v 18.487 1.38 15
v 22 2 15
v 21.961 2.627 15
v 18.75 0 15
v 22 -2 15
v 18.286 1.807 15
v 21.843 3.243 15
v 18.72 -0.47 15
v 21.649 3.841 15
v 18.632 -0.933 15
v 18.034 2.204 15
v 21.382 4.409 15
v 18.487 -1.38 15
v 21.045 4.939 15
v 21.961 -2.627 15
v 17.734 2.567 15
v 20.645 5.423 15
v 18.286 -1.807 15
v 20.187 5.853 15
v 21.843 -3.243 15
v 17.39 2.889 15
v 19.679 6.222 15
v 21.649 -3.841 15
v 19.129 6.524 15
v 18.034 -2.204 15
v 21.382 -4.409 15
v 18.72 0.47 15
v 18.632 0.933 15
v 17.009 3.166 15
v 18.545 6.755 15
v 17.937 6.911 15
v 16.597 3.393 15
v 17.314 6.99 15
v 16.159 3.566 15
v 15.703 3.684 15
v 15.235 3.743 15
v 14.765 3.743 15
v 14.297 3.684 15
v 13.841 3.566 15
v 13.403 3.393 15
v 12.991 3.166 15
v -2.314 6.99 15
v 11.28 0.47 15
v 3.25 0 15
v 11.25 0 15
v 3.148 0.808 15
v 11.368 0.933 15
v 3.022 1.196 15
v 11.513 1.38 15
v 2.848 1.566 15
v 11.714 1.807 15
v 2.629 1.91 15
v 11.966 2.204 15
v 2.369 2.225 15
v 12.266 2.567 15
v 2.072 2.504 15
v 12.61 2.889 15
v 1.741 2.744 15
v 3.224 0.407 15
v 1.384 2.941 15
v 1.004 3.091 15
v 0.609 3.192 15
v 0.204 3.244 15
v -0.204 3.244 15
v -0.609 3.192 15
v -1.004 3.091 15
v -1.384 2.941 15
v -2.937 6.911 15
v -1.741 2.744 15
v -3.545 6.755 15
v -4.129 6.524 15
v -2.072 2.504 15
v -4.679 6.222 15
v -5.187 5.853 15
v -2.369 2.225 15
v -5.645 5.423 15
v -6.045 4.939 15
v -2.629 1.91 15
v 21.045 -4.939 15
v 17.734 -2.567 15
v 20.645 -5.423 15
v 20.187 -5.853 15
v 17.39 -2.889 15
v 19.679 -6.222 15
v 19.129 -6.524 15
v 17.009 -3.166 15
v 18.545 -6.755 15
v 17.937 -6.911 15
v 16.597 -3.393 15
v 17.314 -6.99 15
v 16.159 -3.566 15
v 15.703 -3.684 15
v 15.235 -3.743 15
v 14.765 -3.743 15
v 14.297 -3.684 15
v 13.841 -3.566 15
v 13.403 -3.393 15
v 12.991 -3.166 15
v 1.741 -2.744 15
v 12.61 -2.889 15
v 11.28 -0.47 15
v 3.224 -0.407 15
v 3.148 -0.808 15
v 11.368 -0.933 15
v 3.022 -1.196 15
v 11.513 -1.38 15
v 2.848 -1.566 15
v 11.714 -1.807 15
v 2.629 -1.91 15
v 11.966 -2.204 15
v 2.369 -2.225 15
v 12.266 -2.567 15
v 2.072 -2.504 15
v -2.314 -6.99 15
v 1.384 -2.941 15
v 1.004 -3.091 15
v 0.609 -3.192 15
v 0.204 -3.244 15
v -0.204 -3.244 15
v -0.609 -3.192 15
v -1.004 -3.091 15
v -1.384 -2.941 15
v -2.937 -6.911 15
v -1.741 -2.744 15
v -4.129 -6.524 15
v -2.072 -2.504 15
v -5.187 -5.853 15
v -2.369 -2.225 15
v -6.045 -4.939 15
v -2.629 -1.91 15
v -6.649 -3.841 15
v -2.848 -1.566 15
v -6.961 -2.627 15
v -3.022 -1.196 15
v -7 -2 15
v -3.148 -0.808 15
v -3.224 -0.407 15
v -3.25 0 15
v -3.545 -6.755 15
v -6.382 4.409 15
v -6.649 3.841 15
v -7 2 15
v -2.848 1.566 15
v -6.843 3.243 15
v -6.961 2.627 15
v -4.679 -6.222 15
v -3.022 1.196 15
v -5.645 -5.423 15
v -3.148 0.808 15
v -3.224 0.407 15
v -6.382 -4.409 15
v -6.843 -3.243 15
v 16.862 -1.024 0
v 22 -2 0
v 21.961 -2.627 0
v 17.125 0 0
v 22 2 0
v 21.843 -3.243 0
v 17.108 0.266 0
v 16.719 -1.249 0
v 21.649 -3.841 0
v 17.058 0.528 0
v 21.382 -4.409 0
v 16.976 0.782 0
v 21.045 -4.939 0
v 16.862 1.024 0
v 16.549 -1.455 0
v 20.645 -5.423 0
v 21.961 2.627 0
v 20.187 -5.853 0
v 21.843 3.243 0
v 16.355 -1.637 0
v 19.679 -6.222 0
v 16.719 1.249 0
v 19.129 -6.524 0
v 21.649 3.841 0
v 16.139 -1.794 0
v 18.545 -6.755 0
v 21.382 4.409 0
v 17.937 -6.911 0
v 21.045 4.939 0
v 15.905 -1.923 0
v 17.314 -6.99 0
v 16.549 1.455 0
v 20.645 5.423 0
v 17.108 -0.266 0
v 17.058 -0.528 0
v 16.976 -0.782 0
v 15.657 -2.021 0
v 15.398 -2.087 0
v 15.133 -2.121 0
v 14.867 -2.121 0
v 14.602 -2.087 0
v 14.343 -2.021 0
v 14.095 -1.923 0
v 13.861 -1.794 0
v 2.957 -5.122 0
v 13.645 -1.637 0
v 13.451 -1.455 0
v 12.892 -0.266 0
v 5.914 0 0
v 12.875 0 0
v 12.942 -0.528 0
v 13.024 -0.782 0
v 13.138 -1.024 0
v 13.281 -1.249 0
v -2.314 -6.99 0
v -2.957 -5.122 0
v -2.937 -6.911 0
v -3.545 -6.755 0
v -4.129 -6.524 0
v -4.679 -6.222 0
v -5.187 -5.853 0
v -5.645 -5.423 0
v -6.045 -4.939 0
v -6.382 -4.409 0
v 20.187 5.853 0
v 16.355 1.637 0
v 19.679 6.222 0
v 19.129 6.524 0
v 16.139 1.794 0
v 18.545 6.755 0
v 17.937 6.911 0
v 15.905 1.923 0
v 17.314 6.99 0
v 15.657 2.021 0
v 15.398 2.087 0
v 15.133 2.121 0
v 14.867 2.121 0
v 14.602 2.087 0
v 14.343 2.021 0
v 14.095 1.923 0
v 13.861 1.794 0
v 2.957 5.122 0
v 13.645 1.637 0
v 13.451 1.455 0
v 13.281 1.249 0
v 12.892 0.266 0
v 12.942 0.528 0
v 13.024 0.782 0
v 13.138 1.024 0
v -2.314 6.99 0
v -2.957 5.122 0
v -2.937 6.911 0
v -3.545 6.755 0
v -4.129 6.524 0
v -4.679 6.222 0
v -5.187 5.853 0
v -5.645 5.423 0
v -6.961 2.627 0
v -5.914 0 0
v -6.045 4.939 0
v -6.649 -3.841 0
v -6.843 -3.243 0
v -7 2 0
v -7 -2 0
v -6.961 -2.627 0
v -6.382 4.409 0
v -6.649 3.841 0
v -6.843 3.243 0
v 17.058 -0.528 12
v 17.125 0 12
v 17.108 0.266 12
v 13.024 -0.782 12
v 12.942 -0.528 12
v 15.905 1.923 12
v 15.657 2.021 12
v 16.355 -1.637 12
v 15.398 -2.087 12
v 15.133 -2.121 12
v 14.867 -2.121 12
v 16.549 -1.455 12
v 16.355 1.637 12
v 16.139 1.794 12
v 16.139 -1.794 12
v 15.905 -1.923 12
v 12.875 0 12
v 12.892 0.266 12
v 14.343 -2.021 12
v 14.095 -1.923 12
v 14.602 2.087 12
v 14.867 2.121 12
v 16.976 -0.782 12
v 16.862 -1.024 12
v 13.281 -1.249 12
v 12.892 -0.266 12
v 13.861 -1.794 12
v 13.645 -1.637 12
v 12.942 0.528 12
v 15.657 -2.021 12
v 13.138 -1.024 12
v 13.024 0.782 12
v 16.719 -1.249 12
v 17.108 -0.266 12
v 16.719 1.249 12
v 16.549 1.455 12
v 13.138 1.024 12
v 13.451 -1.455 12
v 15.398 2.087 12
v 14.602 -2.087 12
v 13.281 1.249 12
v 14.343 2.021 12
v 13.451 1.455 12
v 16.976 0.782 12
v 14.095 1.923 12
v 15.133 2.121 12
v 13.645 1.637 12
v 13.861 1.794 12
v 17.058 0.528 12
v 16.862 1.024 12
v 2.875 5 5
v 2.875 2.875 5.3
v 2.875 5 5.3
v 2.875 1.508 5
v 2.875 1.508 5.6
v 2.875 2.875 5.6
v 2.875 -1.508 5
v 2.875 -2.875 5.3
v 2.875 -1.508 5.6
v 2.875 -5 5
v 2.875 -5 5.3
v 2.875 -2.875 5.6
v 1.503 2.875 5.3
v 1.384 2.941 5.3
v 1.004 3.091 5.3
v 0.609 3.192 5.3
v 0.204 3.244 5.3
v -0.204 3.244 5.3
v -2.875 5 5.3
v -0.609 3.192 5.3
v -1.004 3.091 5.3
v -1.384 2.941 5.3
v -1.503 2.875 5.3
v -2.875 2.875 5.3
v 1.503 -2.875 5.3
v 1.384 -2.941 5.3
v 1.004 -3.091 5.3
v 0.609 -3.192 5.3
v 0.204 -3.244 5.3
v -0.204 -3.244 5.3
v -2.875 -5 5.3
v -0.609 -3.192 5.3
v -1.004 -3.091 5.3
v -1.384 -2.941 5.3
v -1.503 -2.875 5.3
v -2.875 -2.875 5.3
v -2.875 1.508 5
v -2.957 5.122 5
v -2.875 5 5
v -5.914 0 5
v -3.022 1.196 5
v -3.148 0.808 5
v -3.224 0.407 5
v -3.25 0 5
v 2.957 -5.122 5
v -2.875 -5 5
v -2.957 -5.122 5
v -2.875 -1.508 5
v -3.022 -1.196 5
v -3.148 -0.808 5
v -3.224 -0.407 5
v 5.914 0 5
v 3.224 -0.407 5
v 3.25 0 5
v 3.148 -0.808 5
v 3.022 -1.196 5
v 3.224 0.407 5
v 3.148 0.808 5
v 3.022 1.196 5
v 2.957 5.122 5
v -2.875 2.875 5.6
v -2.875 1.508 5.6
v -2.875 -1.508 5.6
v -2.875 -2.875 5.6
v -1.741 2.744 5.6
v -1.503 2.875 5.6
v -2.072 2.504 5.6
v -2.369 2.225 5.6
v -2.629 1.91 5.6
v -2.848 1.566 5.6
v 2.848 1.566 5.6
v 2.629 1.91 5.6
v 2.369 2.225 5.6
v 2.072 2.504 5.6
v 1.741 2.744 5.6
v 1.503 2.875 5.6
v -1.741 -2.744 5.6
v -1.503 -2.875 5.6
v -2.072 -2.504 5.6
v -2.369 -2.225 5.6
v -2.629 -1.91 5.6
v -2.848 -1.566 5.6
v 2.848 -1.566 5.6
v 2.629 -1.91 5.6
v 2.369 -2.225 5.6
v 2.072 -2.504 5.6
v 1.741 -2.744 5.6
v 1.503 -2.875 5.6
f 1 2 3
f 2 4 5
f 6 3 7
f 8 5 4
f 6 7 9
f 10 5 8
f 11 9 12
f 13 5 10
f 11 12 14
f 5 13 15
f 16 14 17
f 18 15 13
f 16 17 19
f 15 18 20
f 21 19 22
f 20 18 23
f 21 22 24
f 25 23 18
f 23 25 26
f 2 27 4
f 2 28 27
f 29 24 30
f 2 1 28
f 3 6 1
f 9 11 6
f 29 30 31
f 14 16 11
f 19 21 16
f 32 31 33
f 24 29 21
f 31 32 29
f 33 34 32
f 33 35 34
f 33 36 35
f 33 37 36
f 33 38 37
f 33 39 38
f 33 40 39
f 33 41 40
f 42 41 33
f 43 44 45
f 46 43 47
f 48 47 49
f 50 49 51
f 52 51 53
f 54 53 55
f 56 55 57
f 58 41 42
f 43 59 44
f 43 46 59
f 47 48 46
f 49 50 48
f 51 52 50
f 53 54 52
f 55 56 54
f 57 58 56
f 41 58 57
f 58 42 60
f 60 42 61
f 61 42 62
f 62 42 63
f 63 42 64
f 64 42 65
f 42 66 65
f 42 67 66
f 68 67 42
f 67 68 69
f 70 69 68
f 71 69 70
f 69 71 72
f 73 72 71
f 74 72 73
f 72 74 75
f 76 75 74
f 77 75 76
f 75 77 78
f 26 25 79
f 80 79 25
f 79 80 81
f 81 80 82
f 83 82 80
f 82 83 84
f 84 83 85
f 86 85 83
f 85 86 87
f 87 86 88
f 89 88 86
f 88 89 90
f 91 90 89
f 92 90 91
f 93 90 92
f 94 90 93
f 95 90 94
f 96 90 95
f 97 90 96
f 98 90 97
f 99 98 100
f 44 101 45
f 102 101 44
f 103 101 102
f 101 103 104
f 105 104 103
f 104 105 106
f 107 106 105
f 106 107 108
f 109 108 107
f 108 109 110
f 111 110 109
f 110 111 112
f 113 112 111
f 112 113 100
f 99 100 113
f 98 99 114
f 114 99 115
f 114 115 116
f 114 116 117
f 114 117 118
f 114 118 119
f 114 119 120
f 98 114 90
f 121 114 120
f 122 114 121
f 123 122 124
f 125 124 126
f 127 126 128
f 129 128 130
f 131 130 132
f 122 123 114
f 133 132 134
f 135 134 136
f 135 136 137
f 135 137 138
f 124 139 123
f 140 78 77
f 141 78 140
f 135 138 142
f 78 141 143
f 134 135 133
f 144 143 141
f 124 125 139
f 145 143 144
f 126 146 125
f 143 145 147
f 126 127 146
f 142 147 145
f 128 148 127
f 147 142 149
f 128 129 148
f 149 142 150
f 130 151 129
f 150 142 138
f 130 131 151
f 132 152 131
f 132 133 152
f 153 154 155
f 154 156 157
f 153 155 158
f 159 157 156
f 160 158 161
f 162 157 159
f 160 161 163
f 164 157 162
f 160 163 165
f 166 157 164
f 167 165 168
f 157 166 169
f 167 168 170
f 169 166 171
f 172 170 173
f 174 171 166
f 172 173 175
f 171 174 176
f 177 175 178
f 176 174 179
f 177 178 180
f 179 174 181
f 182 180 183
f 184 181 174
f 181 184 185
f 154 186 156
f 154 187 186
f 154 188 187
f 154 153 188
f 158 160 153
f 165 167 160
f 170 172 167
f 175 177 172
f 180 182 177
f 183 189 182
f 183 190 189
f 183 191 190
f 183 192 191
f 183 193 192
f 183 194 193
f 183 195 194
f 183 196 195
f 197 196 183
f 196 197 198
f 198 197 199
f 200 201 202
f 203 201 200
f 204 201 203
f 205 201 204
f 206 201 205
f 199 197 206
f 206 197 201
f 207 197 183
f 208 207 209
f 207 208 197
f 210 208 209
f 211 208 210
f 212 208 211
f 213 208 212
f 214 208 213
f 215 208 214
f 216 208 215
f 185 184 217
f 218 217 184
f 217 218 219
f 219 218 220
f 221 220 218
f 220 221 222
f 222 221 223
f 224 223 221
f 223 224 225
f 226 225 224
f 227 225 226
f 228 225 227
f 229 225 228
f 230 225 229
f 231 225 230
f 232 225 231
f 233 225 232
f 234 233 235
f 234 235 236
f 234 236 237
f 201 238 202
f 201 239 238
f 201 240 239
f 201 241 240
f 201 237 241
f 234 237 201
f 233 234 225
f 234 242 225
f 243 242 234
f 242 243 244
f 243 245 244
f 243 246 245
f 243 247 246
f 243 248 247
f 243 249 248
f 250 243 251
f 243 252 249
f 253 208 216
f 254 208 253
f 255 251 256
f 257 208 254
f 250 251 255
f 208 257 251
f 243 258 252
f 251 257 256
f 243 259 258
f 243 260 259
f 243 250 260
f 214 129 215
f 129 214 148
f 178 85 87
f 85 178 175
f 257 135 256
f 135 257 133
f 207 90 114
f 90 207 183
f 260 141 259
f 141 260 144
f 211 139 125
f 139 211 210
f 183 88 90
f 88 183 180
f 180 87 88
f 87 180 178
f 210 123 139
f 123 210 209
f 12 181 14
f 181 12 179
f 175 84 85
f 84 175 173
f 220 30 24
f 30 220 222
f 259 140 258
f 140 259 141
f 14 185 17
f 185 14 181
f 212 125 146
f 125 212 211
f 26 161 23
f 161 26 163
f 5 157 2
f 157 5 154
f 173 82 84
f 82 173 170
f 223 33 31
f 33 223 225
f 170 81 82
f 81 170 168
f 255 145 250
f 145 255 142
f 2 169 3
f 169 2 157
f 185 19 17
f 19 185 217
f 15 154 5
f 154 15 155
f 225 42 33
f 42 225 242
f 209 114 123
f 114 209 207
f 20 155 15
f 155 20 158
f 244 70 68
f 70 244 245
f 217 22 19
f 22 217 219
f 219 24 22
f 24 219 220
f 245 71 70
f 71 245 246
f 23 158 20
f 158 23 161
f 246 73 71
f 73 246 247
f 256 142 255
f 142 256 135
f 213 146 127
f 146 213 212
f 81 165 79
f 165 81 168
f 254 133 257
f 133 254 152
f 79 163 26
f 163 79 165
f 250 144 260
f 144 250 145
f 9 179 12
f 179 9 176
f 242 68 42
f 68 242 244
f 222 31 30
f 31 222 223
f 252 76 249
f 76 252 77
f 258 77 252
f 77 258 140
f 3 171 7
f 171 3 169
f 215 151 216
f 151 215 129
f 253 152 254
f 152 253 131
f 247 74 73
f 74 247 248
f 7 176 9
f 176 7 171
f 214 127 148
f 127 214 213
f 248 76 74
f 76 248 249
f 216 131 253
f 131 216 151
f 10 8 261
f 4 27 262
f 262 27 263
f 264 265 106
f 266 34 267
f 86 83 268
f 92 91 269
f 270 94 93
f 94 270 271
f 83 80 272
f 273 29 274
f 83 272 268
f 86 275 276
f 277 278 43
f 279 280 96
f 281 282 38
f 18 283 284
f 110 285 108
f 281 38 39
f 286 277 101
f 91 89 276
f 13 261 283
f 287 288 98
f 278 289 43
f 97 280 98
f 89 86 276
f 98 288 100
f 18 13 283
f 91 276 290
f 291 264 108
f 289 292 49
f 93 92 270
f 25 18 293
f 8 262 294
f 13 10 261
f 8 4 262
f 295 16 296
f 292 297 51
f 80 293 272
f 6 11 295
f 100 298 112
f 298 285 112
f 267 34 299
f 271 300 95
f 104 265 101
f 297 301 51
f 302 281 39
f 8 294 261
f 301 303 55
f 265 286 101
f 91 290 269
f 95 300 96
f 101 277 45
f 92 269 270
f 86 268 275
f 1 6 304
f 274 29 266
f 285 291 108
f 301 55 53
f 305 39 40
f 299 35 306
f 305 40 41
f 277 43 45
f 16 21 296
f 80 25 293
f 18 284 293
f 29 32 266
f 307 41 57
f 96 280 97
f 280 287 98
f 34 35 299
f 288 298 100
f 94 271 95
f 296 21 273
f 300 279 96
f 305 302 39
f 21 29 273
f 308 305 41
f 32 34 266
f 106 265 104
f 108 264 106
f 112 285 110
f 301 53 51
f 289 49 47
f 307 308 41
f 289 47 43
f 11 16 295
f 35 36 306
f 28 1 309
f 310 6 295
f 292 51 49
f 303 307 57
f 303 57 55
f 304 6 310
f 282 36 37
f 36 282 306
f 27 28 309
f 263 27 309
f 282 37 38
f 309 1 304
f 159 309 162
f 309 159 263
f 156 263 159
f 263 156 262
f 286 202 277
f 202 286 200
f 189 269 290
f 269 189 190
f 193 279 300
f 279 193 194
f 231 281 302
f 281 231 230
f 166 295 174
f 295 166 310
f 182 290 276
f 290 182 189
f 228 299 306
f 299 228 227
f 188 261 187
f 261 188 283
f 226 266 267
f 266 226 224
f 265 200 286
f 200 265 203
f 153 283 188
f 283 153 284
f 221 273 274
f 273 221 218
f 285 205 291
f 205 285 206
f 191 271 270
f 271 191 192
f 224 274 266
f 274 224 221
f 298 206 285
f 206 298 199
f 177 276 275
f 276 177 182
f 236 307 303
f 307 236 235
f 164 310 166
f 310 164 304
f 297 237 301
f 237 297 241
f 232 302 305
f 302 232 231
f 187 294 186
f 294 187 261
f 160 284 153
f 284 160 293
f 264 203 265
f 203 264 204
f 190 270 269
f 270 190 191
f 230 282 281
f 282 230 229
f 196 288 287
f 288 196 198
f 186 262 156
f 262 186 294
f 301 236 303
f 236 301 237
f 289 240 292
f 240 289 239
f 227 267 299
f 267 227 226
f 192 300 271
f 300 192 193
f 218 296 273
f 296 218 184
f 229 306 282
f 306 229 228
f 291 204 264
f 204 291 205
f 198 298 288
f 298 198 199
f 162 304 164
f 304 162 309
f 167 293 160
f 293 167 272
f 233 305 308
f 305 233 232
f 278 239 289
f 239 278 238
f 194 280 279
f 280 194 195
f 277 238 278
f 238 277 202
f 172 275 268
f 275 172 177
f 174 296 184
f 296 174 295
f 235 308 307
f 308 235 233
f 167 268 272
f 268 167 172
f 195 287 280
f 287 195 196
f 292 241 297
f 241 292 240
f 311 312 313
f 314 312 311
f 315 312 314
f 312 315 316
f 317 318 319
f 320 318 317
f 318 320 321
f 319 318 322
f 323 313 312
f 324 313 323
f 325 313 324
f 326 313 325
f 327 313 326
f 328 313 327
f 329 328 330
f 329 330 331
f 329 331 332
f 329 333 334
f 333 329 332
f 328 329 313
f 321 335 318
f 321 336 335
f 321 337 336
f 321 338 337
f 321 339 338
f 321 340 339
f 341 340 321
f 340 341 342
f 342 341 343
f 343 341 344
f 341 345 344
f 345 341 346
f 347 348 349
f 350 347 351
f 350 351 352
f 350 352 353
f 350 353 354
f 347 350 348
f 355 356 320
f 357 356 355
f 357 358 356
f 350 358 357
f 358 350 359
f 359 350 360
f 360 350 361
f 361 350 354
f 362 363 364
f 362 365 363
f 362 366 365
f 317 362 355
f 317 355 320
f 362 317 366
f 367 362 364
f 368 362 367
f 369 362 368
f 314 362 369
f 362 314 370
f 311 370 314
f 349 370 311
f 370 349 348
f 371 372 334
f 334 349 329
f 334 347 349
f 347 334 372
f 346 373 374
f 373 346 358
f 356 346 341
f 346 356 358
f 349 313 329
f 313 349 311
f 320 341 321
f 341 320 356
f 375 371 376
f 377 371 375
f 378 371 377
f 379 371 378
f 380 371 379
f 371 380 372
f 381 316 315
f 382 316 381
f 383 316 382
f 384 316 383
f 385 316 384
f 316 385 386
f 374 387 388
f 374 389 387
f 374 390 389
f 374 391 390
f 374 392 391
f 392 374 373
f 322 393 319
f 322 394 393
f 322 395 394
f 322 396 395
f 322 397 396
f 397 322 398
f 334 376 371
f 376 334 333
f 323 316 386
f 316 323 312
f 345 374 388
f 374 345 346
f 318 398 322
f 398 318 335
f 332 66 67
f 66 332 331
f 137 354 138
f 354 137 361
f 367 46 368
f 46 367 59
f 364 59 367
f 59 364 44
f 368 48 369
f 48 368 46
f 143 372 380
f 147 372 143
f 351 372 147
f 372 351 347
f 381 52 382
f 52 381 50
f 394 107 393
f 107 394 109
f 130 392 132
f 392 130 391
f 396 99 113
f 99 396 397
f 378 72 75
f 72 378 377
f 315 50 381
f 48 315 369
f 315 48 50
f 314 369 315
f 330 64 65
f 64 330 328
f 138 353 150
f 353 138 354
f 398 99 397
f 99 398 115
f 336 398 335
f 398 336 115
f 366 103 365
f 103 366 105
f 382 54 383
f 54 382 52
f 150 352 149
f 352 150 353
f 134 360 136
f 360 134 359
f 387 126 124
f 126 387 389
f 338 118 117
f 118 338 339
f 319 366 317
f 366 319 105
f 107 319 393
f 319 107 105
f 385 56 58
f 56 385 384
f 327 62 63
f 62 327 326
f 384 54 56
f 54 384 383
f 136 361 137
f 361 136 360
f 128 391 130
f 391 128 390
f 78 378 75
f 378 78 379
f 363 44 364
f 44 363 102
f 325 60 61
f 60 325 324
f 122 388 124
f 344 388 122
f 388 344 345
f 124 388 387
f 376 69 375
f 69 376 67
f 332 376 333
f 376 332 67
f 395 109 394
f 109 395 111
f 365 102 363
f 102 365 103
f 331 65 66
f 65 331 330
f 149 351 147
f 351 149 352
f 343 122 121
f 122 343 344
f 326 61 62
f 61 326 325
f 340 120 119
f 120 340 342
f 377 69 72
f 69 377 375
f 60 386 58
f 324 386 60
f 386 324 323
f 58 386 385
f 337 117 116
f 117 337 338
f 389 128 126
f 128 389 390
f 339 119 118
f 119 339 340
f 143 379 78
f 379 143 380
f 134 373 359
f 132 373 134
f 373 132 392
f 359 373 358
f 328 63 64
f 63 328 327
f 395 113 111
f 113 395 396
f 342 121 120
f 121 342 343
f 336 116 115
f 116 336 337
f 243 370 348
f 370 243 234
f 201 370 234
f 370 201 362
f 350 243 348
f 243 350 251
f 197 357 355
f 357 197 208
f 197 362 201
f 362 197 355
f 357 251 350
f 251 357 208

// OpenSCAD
$fn = 50;


difference() {
	union() {
		cylinder(h = 15, r = 7.0000000000);
		translate(v = [7.5000000000, 0.0000000000, 0]) {
			hull() {
				translate(v = [-9.5000000000, 2.0000000000, 0]) {
					cylinder(h = 15, r = 5);
				}
				translate(v = [9.5000000000, 2.0000000000, 0]) {
					cylinder(h = 15, r = 5);
				}
				translate(v = [-9.5000000000, -2.0000000000, 0]) {
					cylinder(h = 15, r = 5);
				}
				translate(v = [9.5000000000, -2.0000000000, 0]) {
					cylinder(h = 15, r = 5);
				}
			}
		}
		translate(v = [7.5000000000, 0.0000000000, 0]) {
			hull() {
				translate(v = [-9.5000000000, 2.0000000000, 0]) {
					cylinder(h = 15, r = 5);
				}
				translate(v = [9.5000000000, 2.0000000000, 0]) {
					cylinder(h = 15, r = 5);
				}
				translate(v = [-9.5000000000, -2.0000000000, 0]) {
					cylinder(h = 15, r = 5);
				}
				translate(v = [9.5000000000, -2.0000000000, 0]) {
					cylinder(h = 15, r = 5);
				}
			}
		}
	}
	union() {
		translate(v = [15.0000000000, 0.0000000000, 15]) {
			rotate(a = [0, 0, 0]) {
				difference() {
					union() {
						#translate(v = [0, 0, -15.0000000000]) {
							cylinder(h = 15, r = 2.0000000000);
						}
						#translate(v = [0, 0, -3]) {
							cylinder(h = 3, r1 = 2.1250000000, r2 = 3.7500000000);
						}
						#translate(v = [0, 0, -15.0000000000]) {
							cylinder(h = 15, r = 2.1250000000);
						}
						#translate(v = [0, 0, -15.0000000000]) {
							cylinder(h = 15, r = 2.0000000000);
						}
					}
					union();
				}
			}
		}
		translate(v = [15.0000000000, 0.0000000000, 15]) {
			rotate(a = [0, 0, 0]) {
				difference() {
					union() {
						#translate(v = [0, 0, -15.0000000000]) {
							cylinder(h = 15, r = 2.0000000000);
						}
						#translate(v = [0, 0, -3]) {
							cylinder(h = 3, r1 = 2.1250000000, r2 = 3.7500000000);
						}
						#translate(v = [0, 0, -15.0000000000]) {
							cylinder(h = 15, r = 2.1250000000);
						}
						#translate(v = [0, 0, -15.0000000000]) {
							cylinder(h = 15, r = 2.0000000000);
						}
					}
					union();
				}
			}
		}
		translate(v = [0.0000000000, 0.0000000000, 0]) {
			rotate(a = [0, 0, 0]) {
				difference() {
					union() {
						#translate(v = [-2.8750000000, -5.0000000000, -0.3000000000]) {
							cube(size = [5.7500000000, 10, 0.3000000000]);
						}
						#translate(v = [-2.8750000000, -2.8750000000, -0.6000000000]) {
							cube(size = [5.7500000000, 5.7500000000, 0.3000000000]);
						}
						#translate(v = [-2.8750000000, -5.0000000000, 5]) {
							cube(size = [5.7500000000, 10, 0.3000000000]);
						}
						#translate(v = [-2.8750000000, -2.8750000000, 5.3000000000]) {
							cube(size = [5.7500000000, 5.7500000000, 0.3000000000]);
						}
						#translate(v = [0, 0, -100.0000000000]) {
							cylinder(h = 200, r = 3.2500000000);
						}
						#linear_extrude(height = 5) {
							polygon(points = [[5.9142500000, 0.0000000000], [2.9571250000, 5.1218907443], [-2.9571250000, 5.1218907443], [-5.9142500000, 0.0000000000], [-2.9571250000, -5.1218907443], [2.9571250000, -5.1218907443]]);
						}
						#translate(v = [-2.8750000000, -5.0000000000, -0.3000000000]) {
							cube(size = [5.7500000000, 10, 0.3000000000]);
						}
						#translate(v = [-2.8750000000, -2.8750000000, -0.6000000000]) {
							cube(size = [5.7500000000, 5.7500000000, 0.3000000000]);
						}
						#translate(v = [-2.8750000000, -5.0000000000, 5]) {
							cube(size = [5.7500000000, 10, 0.3000000000]);
						}
						#translate(v = [-2.8750000000, -2.8750000000, 5.3000000000]) {
							cube(size = [5.7500000000, 5.7500000000, 0.3000000000]);
						}
						#translate(v = [0, 0, -100.0000000000]) {
							cylinder(h = 200, r = 3.2500000000);
						}
						#translate(v = [-2.8750000000, -5.0000000000, -0.3000000000]) {
							cube(size = [5.7500000000, 10, 0.3000000000]);
						}
						#translate(v = [-2.8750000000, -2.8750000000, -0.6000000000]) {
							cube(size = [5.7500000000, 5.7500000000, 0.3000000000]);
						}
						#translate(v = [-2.8750000000, -5.0000000000, 5]) {
							cube(size = [5.7500000000, 10, 0.3000000000]);
						}
						#translate(v = [-2.8750000000, -2.8750000000, 5.3000000000]) {
							cube(size = [5.7500000000, 5.7500000000, 0.3000000000]);
						}
						#translate(v = [0, 0, -100.0000000000]) {
							cylinder(h = 200, r = 3.2500000000);
						}
					}
					union();
				}
			}
		}
		translate(v = [0, 0, -100]) {
			cylinder(h = 200, r = 3.2500000000);
		}
		translate(v = [0, 0, -100]) {
			cylinder(h = 200, r = 1.8000000000);
		}
	}
}
